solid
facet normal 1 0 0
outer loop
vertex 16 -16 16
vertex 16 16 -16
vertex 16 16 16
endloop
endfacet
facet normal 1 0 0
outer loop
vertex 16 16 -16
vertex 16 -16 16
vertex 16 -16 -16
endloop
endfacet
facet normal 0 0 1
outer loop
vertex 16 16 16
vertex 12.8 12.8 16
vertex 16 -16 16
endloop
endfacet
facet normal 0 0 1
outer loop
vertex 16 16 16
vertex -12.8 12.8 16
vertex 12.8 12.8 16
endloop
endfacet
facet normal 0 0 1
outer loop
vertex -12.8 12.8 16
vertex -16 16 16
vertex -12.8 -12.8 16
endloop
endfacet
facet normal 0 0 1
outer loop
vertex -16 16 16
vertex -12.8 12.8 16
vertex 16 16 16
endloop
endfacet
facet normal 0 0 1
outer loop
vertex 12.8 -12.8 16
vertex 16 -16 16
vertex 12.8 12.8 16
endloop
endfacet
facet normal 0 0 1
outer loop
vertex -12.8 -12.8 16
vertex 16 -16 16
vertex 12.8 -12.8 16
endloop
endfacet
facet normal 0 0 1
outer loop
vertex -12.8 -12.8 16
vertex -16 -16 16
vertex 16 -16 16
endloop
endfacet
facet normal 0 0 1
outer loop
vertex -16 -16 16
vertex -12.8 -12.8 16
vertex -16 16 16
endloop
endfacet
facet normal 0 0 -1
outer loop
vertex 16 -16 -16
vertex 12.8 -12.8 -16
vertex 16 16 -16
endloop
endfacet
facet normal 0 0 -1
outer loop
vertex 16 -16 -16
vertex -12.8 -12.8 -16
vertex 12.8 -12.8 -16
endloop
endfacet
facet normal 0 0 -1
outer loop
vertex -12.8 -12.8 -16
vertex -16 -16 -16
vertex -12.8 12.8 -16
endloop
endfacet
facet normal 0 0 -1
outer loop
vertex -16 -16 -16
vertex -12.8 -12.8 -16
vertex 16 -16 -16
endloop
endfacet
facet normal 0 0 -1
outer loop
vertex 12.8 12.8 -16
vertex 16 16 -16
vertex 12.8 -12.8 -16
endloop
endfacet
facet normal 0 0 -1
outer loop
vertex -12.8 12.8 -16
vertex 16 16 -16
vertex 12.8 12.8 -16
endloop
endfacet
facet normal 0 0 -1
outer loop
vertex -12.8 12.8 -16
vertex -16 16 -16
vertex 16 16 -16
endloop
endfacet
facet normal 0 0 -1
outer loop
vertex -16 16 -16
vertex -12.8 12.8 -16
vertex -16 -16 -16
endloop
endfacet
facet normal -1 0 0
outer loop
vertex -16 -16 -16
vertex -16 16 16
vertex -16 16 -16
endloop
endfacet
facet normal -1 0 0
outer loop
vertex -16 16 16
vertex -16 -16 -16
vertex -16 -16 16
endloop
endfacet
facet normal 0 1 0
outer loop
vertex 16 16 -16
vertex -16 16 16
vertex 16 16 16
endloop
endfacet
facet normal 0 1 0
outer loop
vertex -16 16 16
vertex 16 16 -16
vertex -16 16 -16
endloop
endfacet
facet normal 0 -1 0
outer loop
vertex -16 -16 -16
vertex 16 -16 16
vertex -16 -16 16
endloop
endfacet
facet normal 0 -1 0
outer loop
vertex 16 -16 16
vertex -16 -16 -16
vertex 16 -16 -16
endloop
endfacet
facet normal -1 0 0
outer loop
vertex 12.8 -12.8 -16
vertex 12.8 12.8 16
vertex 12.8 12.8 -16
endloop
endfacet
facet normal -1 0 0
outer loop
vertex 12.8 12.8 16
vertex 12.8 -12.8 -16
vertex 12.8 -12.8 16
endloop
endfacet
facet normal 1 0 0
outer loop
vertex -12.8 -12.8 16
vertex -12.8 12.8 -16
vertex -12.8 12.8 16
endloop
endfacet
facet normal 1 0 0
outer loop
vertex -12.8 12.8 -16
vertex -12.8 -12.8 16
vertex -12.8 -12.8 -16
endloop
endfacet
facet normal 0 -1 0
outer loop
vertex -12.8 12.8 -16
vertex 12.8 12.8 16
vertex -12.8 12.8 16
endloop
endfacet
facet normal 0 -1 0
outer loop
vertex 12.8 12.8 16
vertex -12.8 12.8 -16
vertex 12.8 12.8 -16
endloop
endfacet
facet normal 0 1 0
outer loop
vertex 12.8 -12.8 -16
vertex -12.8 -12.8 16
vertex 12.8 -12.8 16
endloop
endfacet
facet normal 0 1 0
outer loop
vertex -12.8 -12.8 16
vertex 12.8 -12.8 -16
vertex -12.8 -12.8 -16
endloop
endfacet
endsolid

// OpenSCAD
size=32; //block=32 //item=8

difference(){
cube([size,size,size],center=true);
cube([size*0.8,size*0.8,size*1.1],center=true);
};
